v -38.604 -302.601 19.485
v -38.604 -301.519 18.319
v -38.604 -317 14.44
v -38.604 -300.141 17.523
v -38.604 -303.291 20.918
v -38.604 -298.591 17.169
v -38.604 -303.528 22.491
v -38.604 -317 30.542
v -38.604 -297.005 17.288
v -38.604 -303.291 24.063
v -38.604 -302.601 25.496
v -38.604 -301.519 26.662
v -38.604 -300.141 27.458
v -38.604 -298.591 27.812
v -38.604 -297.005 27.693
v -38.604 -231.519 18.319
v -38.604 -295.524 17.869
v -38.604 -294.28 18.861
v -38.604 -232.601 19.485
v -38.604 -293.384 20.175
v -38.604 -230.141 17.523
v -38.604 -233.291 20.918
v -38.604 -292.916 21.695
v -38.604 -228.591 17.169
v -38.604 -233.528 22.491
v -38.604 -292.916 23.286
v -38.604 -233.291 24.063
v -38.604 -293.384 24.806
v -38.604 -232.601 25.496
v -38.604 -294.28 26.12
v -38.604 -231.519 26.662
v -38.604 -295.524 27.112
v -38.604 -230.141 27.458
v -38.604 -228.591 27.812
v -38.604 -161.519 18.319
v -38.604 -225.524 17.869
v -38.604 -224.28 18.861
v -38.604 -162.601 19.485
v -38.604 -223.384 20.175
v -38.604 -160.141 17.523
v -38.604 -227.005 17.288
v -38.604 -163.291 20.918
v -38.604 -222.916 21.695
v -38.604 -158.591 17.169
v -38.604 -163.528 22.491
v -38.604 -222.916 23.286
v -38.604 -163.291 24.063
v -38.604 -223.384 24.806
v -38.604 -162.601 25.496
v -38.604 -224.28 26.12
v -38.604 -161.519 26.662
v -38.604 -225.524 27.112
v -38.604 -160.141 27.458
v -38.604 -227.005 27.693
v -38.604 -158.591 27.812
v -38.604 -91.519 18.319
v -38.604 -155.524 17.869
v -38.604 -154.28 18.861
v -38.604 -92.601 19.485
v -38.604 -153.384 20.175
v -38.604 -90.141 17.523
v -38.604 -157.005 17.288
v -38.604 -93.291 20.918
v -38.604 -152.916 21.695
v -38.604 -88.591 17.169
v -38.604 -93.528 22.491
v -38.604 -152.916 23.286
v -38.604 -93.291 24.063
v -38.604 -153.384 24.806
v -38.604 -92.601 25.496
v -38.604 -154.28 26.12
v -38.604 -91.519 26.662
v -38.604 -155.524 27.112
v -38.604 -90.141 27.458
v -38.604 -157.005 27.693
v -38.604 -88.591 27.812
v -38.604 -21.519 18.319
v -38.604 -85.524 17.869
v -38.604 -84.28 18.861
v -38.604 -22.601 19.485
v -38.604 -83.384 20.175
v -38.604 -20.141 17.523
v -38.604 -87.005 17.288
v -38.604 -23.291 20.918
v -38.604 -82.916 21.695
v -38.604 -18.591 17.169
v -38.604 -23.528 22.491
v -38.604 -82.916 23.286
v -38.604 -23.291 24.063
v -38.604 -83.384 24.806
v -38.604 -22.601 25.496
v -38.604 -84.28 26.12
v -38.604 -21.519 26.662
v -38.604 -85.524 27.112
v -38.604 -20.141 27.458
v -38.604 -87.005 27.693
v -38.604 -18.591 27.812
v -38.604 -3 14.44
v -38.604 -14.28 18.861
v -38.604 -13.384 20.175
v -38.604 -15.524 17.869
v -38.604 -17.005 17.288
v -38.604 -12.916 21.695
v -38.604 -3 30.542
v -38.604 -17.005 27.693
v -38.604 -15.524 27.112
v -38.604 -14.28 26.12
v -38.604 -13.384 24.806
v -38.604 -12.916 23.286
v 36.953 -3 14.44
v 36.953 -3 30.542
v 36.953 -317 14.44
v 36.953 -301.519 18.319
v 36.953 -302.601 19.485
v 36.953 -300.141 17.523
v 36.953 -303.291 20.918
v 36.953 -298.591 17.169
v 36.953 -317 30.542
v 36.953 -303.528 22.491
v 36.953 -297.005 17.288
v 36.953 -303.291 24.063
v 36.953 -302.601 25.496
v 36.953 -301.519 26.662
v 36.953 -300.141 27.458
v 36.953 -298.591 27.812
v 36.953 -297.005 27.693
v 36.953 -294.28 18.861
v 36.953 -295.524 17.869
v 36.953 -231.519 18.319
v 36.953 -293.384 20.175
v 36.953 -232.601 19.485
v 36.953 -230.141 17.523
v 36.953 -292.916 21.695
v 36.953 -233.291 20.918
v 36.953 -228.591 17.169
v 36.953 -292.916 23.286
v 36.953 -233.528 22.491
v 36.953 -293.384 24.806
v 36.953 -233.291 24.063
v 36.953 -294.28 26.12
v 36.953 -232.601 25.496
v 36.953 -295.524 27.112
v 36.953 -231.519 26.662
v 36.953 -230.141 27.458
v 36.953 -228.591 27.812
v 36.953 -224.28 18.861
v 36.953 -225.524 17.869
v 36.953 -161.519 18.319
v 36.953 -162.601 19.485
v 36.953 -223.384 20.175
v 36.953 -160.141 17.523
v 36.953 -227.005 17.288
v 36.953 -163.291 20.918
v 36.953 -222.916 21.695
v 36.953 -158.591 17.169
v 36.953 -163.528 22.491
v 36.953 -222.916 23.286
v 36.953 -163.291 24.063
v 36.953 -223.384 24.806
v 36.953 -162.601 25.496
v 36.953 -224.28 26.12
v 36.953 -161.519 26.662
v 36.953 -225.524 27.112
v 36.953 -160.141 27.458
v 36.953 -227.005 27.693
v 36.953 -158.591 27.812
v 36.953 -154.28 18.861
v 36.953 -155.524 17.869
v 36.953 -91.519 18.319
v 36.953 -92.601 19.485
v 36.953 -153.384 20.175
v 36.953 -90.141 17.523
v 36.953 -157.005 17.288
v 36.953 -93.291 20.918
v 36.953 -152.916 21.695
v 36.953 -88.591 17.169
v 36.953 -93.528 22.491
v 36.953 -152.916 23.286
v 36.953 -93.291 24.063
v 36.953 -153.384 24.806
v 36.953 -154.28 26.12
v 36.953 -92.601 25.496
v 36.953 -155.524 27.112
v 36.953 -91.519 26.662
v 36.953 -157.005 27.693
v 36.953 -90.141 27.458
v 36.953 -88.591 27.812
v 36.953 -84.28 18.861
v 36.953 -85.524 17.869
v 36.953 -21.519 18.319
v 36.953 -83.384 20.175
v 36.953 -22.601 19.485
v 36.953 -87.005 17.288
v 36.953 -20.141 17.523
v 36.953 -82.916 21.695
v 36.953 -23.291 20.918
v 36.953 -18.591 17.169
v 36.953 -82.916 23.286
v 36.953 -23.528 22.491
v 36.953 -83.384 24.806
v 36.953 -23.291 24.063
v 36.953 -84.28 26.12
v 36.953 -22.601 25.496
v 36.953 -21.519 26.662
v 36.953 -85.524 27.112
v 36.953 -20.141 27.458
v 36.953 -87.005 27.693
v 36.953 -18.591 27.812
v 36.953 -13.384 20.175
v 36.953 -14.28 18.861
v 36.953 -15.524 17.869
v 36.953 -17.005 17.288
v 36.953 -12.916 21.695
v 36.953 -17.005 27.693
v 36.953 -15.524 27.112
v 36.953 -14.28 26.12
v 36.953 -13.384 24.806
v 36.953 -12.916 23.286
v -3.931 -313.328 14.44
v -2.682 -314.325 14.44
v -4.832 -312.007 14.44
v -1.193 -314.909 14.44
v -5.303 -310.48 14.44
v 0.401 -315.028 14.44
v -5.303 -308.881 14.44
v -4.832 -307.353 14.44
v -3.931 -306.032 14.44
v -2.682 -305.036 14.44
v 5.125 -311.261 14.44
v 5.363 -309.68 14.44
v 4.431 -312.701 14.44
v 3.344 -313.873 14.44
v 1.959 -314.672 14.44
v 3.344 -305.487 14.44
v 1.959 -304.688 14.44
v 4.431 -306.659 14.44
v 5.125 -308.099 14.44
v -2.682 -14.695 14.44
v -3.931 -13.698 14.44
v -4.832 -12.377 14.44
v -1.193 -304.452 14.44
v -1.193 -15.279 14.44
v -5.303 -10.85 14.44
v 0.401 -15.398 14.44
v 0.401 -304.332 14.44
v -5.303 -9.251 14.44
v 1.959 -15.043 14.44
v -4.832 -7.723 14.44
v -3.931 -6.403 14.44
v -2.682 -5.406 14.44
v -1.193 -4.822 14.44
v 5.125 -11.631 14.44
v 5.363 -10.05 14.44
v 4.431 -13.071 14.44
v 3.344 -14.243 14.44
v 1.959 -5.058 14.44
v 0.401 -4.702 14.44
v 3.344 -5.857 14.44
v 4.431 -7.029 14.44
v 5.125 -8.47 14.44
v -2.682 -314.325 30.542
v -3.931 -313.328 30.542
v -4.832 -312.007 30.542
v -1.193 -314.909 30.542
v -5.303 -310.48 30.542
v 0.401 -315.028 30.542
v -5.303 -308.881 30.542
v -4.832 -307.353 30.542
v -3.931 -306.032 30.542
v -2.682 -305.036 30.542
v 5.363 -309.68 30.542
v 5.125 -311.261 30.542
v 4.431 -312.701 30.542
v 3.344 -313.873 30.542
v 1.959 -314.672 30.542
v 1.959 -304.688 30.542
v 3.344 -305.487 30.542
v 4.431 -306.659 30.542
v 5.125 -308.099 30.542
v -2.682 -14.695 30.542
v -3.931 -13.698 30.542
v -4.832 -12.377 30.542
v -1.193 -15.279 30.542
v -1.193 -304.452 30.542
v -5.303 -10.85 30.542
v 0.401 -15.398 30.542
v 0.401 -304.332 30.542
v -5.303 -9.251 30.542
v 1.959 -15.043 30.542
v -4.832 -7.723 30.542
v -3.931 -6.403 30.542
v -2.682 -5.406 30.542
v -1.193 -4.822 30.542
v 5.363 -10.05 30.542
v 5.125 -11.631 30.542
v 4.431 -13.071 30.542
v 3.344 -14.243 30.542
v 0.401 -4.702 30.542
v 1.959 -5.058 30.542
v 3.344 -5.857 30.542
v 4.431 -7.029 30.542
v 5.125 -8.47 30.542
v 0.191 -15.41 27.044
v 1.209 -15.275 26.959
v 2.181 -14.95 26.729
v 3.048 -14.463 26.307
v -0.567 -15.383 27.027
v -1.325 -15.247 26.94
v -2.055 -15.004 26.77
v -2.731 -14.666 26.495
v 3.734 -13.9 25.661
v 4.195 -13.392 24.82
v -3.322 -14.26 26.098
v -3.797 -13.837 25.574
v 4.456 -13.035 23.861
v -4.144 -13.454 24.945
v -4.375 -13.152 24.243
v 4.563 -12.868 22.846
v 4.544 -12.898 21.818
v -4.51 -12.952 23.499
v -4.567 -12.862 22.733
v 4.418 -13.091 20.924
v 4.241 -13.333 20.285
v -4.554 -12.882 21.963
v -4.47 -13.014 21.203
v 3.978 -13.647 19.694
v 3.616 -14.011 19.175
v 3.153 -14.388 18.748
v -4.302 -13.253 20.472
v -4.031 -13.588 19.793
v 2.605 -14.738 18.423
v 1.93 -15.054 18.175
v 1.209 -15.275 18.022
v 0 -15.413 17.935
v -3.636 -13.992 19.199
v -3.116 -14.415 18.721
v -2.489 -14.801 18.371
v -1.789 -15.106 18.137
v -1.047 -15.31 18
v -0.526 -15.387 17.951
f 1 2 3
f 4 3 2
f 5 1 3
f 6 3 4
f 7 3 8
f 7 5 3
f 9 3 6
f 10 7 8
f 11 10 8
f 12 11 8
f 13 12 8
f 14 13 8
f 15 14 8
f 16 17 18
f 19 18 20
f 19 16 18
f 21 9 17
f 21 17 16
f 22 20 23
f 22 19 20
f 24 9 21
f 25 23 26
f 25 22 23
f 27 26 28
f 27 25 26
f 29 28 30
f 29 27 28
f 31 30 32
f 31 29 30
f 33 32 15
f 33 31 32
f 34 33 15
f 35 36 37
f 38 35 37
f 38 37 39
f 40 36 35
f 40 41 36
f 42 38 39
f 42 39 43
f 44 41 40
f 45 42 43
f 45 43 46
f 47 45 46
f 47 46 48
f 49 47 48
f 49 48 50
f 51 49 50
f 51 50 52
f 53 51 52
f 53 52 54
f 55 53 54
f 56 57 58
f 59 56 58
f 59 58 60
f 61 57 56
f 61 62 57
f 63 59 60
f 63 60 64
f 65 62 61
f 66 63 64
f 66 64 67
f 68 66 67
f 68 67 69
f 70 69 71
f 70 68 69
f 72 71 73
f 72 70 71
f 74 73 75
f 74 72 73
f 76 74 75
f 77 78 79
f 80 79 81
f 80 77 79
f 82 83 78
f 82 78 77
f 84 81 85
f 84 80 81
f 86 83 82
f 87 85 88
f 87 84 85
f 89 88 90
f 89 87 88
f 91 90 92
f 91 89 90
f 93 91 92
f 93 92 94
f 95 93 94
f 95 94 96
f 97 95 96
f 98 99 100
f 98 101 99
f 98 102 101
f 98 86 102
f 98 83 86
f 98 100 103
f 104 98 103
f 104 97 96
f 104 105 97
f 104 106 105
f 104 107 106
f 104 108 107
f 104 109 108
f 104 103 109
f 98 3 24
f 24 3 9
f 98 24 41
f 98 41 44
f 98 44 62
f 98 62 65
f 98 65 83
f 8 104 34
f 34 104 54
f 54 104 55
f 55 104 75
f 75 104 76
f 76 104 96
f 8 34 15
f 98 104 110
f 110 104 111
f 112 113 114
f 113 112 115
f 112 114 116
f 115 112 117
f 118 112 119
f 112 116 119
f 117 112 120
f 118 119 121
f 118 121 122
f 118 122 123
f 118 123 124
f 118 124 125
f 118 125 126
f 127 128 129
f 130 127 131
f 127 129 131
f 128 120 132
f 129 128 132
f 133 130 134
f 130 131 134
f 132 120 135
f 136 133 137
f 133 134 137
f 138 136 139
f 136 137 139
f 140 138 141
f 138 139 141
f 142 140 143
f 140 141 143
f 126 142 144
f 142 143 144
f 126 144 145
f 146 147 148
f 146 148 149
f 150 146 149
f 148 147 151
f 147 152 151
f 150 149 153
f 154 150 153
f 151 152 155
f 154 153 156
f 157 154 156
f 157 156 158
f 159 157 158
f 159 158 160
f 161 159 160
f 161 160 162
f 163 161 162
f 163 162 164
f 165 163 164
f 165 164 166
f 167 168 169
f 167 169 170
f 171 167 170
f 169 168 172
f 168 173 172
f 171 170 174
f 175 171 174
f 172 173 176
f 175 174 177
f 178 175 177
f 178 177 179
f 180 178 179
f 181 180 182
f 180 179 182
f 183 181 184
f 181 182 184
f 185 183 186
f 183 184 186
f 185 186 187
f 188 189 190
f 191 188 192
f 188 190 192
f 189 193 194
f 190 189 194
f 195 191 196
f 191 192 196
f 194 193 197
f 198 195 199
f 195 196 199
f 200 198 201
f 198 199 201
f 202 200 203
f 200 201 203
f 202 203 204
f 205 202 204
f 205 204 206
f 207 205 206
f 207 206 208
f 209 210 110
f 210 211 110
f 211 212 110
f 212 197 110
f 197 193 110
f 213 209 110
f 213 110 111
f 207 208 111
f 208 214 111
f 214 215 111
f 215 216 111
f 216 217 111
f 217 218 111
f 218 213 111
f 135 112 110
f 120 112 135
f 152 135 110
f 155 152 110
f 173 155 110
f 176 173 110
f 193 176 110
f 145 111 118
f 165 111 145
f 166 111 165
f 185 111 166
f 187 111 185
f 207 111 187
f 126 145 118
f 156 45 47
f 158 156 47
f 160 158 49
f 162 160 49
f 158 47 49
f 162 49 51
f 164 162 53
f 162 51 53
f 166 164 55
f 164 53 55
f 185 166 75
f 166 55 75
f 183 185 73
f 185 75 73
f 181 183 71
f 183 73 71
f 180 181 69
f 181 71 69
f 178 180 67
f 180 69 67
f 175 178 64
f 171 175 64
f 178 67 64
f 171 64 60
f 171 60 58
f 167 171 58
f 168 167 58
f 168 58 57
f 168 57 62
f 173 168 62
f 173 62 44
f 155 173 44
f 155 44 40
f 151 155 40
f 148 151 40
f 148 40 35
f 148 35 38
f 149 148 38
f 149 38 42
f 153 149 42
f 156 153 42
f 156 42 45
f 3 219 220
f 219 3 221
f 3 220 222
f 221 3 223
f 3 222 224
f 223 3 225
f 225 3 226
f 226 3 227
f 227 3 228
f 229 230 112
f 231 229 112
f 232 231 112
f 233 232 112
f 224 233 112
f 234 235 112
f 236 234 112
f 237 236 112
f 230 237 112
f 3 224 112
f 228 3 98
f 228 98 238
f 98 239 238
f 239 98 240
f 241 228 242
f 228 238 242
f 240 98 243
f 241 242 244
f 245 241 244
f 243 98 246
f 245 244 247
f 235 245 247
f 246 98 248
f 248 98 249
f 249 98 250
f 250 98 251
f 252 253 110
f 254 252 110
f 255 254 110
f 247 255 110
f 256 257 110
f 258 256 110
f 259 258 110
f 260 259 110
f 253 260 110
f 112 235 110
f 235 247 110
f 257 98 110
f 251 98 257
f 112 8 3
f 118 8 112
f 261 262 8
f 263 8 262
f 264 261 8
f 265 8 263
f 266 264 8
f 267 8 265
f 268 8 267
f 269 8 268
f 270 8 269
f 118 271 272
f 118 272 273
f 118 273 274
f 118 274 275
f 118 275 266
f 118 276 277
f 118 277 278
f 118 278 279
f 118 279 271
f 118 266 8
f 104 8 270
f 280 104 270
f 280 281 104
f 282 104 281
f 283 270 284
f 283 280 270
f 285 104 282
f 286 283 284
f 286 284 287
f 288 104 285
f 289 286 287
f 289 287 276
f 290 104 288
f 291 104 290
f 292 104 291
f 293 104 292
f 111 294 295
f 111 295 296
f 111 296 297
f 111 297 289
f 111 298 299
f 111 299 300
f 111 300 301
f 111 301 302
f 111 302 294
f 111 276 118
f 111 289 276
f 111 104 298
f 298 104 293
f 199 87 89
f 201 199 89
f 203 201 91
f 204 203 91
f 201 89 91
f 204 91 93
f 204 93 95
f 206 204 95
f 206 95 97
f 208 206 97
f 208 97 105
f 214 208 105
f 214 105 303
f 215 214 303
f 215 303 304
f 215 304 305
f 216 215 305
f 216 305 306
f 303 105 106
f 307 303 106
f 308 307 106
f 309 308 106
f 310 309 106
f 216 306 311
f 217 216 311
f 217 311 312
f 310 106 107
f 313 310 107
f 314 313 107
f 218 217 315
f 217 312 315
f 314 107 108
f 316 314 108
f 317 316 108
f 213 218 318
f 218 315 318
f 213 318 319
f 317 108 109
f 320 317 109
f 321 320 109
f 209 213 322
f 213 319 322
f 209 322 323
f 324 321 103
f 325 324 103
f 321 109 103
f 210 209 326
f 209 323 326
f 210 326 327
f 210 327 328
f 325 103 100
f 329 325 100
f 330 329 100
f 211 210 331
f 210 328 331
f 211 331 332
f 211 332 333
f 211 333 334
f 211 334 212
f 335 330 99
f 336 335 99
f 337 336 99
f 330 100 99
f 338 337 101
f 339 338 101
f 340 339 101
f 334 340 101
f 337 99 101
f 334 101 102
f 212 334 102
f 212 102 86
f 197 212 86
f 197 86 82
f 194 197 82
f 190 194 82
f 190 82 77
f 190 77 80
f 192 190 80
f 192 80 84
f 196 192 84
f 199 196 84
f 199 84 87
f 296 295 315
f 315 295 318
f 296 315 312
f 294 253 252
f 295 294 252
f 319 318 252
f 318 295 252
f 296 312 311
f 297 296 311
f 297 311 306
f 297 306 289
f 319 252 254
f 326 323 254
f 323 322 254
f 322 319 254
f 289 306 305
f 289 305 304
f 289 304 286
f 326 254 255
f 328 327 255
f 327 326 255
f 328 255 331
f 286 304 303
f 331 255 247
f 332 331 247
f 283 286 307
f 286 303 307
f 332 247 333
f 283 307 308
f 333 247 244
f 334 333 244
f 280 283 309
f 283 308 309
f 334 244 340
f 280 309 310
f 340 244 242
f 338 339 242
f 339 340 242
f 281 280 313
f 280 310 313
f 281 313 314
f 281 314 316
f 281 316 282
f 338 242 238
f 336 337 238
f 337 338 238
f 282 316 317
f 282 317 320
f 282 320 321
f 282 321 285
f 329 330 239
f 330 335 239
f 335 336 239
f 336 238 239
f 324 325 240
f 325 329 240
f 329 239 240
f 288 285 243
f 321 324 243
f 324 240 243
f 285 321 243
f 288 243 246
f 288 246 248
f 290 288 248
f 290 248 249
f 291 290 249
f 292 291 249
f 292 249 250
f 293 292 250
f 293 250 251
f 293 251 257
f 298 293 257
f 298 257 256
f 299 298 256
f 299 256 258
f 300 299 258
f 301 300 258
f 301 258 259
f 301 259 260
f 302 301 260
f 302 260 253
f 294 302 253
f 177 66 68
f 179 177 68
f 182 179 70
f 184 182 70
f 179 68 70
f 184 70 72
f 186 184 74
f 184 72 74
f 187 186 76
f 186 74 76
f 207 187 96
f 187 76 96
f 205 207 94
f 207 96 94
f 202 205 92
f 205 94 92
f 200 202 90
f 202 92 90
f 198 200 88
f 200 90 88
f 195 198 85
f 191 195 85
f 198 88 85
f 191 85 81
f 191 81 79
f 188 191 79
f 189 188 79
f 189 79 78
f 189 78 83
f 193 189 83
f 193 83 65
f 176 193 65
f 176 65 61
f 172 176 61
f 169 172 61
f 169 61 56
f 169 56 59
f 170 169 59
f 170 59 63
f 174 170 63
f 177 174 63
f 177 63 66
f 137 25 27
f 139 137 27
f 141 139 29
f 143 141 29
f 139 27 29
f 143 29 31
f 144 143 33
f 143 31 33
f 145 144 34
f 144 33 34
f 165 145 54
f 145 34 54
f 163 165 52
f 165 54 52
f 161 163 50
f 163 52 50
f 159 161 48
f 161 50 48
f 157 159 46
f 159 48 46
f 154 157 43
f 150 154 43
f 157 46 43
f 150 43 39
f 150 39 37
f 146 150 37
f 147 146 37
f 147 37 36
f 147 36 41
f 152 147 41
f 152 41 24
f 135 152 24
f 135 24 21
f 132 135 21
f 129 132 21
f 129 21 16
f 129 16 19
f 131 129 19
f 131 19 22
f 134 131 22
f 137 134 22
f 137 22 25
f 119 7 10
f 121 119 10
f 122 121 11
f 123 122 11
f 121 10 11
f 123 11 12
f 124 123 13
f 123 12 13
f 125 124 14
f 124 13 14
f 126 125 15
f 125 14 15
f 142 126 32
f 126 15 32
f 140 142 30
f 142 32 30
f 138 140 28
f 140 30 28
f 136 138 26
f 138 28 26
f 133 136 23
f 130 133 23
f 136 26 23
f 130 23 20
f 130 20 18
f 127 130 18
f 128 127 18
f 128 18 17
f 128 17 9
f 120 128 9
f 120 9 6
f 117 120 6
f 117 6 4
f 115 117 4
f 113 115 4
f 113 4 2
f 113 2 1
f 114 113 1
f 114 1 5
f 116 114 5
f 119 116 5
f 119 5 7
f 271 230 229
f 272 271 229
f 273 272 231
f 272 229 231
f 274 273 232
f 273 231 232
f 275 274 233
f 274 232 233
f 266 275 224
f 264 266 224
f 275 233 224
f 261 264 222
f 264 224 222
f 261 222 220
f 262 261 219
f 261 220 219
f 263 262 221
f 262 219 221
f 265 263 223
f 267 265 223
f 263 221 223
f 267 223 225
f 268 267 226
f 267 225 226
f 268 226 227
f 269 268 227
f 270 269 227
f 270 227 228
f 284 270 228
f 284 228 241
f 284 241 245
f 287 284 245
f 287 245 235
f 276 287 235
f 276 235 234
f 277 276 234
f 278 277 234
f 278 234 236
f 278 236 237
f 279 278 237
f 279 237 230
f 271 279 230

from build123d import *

# Parameters (mm, degrees)
F0_W     = 75.557
F0_H     = 16.102
F1_DEPTH = 313
F2_R     = 5.336
F3_DEPTH = 75.558
F4_DEPTH = 4
F5_DEPTH = 3
F6_R     = 5.363
F7_DEPTH = 25
F8_R     = 5.363
F9_DEPTH = 25


with BuildPart() as f1:
    # F0 (on Front) → F1 (new body)
    with BuildSketch(Plane.XZ):
        with Locations((-0.825944015, 22.4905000767)):
            Rectangle(F0_W, F0_H)
    extrude(amount=F1_DEPTH)

    # F2 (on face) → F3 (cut, through all)
    with BuildSketch(Plane(origin=(-38.604444015, 0, 0), x_dir=(0, -1, 0), z_dir=(-1, 0, 0))):
        with Locations((18.192, 22.4905000767)):
            Circle(F2_R)
        with Locations((88.192, 22.4905000767)):
            Circle(F2_R)
        with Locations((158.192, 22.4905000767)):
            Circle(F2_R)
        with Locations((228.192, 22.4905000767)):
            Circle(F2_R)
        with Locations((298.192, 22.4905000767)):
            Circle(F2_R)
    extrude(amount=-F3_DEPTH, mode=Mode.SUBTRACT)

    # F4 (add): a face of the model
    f4_faces = [f1.faces().sort_by_distance(p)[0] for p in [
        (-0.825944015, -313, 22.4905000767),
    ]]
    extrude(f4_faces, amount=F4_DEPTH)

    # F5 (cut): a face of the model
    f5_faces = [f1.faces().sort_by_distance(p)[0] for p in [
        (-0.825944015, 0, 22.4905000767),
    ]]
    extrude(f5_faces, amount=-F5_DEPTH, mode=Mode.SUBTRACT)

    # F6 (on face) → F7 (cut)
    with BuildSketch(Plane(origin=(0, 0, 14.4395000767), x_dir=(1, 0, 0), z_dir=(0, 0, -1))):
        with Locations((0, 309.6801936626)):
            Circle(F6_R)
    extrude(amount=-F7_DEPTH, mode=Mode.SUBTRACT)

    # F8 (on face) → F9 (cut)
    with BuildSketch(Plane(origin=(0, 0, 14.4395000767), x_dir=(1, 0, 0), z_dir=(0, 0, -1))):
        with Locations((0, 10.0503147011)):
            Circle(F8_R)
    extrude(amount=-F9_DEPTH, mode=Mode.SUBTRACT)


solid = f1.part
